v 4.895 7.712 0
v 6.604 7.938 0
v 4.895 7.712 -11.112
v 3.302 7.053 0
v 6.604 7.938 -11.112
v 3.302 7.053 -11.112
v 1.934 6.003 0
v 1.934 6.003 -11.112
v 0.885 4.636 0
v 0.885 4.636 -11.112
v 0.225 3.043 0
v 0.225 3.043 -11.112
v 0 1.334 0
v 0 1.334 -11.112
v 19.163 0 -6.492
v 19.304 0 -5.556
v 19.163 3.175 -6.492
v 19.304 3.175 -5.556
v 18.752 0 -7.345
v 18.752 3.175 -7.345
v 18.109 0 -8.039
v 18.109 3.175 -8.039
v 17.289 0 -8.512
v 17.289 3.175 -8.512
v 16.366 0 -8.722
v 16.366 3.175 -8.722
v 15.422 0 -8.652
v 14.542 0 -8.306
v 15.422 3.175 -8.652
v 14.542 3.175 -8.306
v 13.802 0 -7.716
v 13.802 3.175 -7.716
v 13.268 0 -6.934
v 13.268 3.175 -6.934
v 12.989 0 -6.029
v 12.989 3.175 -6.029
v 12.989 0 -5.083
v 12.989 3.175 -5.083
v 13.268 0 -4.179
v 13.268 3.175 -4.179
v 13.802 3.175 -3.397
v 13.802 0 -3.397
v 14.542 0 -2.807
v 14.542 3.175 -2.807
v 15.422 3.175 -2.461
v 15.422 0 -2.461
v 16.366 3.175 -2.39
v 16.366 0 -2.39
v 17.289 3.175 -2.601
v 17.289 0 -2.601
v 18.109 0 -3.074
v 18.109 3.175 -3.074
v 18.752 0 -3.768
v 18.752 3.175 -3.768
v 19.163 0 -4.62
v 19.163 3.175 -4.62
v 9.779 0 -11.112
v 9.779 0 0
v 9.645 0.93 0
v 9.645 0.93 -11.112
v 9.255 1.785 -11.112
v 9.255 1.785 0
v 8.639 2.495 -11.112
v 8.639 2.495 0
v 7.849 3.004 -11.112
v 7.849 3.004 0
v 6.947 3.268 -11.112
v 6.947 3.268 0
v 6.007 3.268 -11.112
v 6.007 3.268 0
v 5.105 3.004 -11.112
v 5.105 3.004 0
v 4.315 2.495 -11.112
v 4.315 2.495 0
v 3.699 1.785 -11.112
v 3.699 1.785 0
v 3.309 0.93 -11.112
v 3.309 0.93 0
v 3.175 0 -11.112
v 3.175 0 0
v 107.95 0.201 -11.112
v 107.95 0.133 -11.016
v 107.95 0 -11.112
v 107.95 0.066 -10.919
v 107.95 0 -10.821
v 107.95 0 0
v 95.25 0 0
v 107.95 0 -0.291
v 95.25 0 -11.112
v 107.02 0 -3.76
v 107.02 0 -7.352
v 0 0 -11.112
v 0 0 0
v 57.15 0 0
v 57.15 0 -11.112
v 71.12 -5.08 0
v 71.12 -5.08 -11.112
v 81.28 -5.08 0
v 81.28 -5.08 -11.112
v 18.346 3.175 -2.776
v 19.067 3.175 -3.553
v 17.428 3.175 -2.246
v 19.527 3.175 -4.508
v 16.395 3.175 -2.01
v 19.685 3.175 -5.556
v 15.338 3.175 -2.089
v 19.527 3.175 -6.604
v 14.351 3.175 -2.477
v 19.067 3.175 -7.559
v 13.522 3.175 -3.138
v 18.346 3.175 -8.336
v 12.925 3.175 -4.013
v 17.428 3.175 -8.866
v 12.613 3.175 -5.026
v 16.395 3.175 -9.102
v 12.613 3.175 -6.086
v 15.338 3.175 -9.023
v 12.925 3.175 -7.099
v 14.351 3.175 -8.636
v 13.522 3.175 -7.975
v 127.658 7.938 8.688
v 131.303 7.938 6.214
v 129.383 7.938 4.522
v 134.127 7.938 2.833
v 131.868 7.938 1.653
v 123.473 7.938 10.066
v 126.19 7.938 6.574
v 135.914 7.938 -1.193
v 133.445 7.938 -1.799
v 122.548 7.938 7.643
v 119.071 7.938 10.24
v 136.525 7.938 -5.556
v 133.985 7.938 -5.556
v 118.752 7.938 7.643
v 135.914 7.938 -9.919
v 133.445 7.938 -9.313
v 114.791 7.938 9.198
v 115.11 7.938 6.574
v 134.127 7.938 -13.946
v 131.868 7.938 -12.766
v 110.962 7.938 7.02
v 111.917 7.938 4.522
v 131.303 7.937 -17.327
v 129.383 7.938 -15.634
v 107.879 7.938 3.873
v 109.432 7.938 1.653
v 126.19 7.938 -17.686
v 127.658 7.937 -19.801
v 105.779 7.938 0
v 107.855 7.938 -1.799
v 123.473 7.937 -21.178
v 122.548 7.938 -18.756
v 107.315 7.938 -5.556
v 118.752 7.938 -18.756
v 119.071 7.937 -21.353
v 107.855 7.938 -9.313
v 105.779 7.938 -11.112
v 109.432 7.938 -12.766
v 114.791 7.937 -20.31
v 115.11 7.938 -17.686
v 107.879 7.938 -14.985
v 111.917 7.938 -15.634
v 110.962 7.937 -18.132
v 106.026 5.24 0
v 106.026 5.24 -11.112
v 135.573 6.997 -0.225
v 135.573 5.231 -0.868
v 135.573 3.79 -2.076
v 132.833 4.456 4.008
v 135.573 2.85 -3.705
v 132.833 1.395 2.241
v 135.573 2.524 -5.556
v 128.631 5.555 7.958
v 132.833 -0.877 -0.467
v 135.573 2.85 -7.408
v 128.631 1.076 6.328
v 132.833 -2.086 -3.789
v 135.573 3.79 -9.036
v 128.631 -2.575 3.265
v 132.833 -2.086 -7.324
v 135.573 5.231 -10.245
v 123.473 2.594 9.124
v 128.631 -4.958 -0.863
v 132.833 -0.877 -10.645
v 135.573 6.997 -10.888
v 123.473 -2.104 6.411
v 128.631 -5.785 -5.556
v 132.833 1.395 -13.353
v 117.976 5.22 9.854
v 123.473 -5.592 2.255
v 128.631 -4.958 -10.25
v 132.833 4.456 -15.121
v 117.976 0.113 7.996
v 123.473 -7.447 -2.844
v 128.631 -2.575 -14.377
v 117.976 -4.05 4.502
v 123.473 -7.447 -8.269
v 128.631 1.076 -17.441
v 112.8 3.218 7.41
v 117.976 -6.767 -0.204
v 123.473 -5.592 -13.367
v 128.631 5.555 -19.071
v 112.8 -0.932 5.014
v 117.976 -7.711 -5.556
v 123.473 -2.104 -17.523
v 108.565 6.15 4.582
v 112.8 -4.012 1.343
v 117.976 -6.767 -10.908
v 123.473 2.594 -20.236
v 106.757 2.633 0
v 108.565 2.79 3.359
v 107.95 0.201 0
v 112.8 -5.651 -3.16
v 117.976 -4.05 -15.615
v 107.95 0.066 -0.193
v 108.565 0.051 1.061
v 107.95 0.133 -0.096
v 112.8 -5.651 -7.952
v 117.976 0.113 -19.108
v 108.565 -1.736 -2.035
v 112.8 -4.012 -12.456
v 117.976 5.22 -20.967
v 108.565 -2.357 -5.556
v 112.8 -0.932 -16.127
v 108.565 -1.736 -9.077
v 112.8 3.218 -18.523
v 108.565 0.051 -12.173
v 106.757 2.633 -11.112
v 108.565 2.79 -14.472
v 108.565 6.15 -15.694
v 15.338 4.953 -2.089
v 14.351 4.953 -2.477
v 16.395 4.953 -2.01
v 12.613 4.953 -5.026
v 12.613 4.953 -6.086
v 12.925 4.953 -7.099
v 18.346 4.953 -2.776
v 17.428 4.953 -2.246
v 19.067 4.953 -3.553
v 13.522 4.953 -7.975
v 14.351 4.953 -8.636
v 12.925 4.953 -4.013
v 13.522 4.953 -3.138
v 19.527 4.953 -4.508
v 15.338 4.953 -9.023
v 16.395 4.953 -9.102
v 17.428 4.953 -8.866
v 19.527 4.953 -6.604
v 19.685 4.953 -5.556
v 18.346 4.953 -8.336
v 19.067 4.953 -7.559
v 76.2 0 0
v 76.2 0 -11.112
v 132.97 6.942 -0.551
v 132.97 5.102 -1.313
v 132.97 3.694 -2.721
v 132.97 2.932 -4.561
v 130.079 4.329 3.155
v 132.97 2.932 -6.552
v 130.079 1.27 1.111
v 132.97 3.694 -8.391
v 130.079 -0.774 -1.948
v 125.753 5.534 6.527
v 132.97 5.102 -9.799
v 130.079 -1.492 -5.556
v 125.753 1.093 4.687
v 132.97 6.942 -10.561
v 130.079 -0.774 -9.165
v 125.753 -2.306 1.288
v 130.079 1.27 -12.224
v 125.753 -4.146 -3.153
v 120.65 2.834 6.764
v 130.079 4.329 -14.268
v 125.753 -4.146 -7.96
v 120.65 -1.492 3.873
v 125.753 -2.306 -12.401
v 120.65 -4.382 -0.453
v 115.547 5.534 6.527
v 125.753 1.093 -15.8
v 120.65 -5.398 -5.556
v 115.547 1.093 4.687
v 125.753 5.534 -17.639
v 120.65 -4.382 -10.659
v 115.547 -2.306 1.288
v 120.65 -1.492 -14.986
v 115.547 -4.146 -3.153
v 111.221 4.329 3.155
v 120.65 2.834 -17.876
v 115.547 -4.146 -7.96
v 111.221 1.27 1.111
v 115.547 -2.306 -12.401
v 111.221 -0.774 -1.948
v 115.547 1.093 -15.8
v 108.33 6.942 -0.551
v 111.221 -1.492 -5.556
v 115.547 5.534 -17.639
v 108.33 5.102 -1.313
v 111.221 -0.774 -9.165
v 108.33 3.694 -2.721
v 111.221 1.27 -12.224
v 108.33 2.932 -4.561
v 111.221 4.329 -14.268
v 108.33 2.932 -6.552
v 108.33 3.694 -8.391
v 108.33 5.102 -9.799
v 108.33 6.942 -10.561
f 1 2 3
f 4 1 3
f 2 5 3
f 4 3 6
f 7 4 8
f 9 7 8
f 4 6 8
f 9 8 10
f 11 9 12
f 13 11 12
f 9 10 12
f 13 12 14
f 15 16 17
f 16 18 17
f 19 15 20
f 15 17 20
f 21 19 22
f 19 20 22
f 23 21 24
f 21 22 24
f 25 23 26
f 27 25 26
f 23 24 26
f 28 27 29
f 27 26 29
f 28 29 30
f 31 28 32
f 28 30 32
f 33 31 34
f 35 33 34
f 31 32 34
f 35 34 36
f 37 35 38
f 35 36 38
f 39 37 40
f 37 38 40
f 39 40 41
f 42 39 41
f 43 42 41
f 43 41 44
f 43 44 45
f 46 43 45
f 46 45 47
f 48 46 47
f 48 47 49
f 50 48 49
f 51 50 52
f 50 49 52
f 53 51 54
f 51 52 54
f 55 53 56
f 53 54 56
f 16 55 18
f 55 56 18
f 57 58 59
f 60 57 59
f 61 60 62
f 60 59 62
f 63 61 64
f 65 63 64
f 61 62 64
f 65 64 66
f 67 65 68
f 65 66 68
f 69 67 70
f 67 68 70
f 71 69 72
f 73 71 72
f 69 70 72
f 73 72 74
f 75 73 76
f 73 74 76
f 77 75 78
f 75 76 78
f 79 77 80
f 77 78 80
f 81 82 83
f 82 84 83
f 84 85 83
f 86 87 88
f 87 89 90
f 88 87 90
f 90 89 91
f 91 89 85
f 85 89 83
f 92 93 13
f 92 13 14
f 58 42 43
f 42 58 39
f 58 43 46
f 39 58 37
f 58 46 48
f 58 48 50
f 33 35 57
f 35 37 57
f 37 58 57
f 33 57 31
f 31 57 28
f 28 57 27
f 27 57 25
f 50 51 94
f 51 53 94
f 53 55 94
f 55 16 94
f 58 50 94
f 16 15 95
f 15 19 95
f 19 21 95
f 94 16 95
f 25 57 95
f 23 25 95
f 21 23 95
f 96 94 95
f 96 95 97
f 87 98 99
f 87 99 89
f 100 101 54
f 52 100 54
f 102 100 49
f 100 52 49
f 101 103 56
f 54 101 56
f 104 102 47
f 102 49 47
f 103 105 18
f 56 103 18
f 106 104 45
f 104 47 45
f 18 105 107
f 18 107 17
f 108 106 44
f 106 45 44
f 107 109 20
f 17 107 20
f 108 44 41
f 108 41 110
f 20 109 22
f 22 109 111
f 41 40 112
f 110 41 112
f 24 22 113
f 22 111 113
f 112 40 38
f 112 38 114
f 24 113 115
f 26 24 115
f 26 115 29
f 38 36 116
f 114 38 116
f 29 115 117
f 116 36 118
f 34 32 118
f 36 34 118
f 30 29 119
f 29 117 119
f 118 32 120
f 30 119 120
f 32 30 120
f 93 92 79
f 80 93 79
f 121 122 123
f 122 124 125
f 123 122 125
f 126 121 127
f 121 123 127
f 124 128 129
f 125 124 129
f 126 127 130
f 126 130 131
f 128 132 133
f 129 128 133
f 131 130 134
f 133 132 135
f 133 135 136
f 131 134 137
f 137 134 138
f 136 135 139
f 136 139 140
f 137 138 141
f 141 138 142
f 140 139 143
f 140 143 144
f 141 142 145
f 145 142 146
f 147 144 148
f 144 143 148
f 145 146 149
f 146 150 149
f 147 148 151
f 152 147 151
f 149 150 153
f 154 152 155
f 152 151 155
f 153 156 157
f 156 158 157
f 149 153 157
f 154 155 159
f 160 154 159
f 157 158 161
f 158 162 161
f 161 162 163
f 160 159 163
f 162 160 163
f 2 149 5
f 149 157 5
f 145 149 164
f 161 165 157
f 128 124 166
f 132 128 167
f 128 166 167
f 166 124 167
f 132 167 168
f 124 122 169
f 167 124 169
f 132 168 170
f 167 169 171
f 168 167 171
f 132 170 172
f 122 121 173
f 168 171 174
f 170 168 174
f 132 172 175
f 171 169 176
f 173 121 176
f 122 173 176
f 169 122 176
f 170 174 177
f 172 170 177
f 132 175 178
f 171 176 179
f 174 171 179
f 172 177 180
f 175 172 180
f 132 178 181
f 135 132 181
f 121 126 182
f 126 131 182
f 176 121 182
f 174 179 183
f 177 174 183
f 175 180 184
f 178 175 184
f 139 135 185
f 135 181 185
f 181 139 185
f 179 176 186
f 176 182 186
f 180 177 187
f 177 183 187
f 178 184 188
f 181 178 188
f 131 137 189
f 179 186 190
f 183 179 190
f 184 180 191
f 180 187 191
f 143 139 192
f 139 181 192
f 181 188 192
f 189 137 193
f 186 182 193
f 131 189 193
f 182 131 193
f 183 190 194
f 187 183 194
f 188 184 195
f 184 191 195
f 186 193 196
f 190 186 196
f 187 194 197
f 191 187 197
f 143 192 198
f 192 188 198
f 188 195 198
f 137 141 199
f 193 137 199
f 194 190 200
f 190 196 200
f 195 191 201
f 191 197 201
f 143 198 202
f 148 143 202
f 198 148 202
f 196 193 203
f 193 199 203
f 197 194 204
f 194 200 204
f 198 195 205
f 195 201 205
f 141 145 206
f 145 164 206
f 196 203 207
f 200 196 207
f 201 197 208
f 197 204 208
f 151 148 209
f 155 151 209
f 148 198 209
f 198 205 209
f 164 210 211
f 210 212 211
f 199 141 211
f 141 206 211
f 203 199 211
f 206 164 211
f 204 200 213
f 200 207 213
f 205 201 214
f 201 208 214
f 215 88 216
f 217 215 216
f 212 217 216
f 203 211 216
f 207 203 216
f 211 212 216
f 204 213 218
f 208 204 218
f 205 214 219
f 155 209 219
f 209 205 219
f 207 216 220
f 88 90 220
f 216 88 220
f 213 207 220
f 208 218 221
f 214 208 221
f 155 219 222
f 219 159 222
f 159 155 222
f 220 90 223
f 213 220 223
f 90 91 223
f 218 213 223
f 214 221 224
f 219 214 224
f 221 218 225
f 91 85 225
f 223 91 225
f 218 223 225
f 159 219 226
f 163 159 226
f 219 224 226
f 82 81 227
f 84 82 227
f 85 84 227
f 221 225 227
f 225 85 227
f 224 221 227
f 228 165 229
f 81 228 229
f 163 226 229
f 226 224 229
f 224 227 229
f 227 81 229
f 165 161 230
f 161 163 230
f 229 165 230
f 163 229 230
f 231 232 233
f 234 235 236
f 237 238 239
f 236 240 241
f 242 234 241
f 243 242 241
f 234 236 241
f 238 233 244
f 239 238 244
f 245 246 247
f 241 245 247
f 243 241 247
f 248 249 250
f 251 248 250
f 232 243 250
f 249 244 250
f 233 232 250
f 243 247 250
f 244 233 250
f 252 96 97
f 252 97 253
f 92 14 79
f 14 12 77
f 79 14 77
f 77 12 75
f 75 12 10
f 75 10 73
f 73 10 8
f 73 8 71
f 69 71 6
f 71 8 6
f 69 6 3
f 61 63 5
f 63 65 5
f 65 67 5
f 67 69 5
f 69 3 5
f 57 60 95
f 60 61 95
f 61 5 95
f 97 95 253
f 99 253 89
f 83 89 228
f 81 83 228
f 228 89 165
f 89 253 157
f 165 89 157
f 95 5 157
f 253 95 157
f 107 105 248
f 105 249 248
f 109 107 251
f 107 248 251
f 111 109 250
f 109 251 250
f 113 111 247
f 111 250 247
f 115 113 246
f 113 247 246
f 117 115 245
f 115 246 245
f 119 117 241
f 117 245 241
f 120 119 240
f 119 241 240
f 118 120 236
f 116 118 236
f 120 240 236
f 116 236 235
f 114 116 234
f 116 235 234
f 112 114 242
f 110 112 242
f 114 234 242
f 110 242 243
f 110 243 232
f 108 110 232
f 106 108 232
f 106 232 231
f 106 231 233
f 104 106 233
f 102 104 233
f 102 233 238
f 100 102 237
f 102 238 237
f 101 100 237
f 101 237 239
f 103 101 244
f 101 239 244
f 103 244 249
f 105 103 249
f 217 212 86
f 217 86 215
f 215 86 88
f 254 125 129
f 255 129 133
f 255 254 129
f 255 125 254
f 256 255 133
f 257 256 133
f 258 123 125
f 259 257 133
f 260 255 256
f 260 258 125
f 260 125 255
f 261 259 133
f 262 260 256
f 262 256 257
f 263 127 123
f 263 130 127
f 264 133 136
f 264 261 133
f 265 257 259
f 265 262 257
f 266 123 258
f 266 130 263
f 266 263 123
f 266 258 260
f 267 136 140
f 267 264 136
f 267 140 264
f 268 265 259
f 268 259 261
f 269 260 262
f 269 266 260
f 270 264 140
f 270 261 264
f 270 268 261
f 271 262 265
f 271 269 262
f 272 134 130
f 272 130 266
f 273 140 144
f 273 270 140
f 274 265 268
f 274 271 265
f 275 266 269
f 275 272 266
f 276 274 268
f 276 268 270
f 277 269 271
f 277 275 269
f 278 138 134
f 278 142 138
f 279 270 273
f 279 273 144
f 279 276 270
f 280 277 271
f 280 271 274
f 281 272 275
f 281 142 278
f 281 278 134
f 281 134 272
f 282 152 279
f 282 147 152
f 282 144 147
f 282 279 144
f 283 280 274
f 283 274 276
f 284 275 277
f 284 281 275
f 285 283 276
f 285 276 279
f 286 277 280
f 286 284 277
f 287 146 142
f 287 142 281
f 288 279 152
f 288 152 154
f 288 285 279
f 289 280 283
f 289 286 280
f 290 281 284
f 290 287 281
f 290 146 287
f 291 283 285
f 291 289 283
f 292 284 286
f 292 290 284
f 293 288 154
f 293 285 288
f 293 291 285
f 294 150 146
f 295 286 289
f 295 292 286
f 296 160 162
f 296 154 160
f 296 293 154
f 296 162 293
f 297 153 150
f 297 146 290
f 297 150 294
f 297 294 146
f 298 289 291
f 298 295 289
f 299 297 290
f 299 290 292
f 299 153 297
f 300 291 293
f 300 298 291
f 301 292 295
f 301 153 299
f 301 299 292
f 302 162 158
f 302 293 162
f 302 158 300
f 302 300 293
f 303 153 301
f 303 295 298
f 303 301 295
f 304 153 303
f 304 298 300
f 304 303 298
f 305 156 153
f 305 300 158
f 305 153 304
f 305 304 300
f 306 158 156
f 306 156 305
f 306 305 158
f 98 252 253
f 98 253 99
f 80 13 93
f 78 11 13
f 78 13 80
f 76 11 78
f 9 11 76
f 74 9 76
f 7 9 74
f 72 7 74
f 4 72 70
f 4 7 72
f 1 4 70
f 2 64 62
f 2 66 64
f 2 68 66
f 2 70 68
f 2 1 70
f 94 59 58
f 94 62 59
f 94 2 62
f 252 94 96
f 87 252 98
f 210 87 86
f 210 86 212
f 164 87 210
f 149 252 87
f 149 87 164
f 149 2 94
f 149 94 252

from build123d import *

# Parameters (mm, degrees)
SKETCH1_W               = 107.95
SKETCH1_H               = 11.1125
BOSS_EXTRUDE1_DEPTH     = 7.9375
CUT_EXTRUDE1_DEPTH      = 1
CUT_EXTRUDE1_DEPTH_BACK = 12.1125
BOSS_EXTRUDE2_DEPTH     = 11.1125
FILLET1_R               = 6.604
REVOLVE1_ANGLE          = 180


with BuildPart() as part:
    # Sketch1 → Boss-Extrude1 (new body)
    with BuildSketch(Plane(origin=(0, 0, 0), x_dir=(1, 0, 0), z_dir=(0, 1, 0))):
        with Locations((53.975, 5.55625)):
            Rectangle(SKETCH1_W, SKETCH1_H)
    extrude(amount=BOSS_EXTRUDE1_DEPTH)

    # Sketch2 → Cut-Extrude1 (cut, two sides)
    with BuildSketch(Plane.XY) as cut_extrude1_sk:
        with BuildLine():
            Line((3.175, 0), (9.779, 0))
            ThreePointArc((9.779, 0), (6.477, 3.302), (3.175, 0))
        make_face()
    extrude(amount=CUT_EXTRUDE1_DEPTH, mode=Mode.SUBTRACT)
    extrude(cut_extrude1_sk.sketch, amount=-CUT_EXTRUDE1_DEPTH_BACK, mode=Mode.SUBTRACT)

    # Sketch2<4> → Boss-Extrude2 (add, through all)
    with BuildSketch(Plane.XY):
        Polygon((76.2, 0), (57.15, 0), (71.12, -5.08), align=None)
        Polygon((95.25, 0), (76.2, 0), (81.28, -5.08), align=None)
    extrude(amount=-BOSS_EXTRUDE2_DEPTH)

    # Fillet1
    fillet1_edges = [part.edges().sort_by_distance(p)[0] for p in [
        (0, 7.9375, -5.55625),
    ]]
    fillet(fillet1_edges, radius=FILLET1_R)

    # Sketch3 → Revolve1 (revolve)
    with BuildSketch(Plane(origin=(0, 7.9375, 0), x_dir=(1, 0, 0), z_dir=(0, 1, 0))):
        with BuildLine():
            Line((104.775, 5.55625), (136.525, 5.55625))
            ThreePointArc((136.525, 5.55625), (120.65, -10.31875), (104.775, 5.55625))
        make_face()
    revolve(axis=Axis((104.775, 7.9375, -5.55625), (1, 0, 0)), revolution_arc=REVOLVE1_ANGLE)

    # Sketch5 → Cut-Revolve2 (revolve, cut)
    with BuildSketch(Plane(origin=(0, 7.9375, 0), x_dir=(1, 0, 0), z_dir=(0, 1, 0))):
        with BuildLine():
            Line((107.315, 5.55625), (133.985, 5.55625))
            ThreePointArc((133.985, 5.55625), (120.65, -7.77875), (107.315, 5.55625))
        make_face()
    revolve(axis=Axis((107.315, 7.9375, -5.55625), (1, 0, 0)), mode=Mode.SUBTRACT)

    # Sketch6 → Cut-Revolve3 (revolve, cut)
    with BuildSketch(Plane.XY.offset(-5.55625)):
        Polygon((16.129, 0), (19.304, 0), (19.304, 3.175), (19.685, 3.175), (19.685, 4.953), (16.129, 4.953), (16.129, 3.175), align=None)
    revolve(axis=Axis((16.129, 0, -5.55625), (0, 1, 0)), mode=Mode.SUBTRACT)


solid = part.part
